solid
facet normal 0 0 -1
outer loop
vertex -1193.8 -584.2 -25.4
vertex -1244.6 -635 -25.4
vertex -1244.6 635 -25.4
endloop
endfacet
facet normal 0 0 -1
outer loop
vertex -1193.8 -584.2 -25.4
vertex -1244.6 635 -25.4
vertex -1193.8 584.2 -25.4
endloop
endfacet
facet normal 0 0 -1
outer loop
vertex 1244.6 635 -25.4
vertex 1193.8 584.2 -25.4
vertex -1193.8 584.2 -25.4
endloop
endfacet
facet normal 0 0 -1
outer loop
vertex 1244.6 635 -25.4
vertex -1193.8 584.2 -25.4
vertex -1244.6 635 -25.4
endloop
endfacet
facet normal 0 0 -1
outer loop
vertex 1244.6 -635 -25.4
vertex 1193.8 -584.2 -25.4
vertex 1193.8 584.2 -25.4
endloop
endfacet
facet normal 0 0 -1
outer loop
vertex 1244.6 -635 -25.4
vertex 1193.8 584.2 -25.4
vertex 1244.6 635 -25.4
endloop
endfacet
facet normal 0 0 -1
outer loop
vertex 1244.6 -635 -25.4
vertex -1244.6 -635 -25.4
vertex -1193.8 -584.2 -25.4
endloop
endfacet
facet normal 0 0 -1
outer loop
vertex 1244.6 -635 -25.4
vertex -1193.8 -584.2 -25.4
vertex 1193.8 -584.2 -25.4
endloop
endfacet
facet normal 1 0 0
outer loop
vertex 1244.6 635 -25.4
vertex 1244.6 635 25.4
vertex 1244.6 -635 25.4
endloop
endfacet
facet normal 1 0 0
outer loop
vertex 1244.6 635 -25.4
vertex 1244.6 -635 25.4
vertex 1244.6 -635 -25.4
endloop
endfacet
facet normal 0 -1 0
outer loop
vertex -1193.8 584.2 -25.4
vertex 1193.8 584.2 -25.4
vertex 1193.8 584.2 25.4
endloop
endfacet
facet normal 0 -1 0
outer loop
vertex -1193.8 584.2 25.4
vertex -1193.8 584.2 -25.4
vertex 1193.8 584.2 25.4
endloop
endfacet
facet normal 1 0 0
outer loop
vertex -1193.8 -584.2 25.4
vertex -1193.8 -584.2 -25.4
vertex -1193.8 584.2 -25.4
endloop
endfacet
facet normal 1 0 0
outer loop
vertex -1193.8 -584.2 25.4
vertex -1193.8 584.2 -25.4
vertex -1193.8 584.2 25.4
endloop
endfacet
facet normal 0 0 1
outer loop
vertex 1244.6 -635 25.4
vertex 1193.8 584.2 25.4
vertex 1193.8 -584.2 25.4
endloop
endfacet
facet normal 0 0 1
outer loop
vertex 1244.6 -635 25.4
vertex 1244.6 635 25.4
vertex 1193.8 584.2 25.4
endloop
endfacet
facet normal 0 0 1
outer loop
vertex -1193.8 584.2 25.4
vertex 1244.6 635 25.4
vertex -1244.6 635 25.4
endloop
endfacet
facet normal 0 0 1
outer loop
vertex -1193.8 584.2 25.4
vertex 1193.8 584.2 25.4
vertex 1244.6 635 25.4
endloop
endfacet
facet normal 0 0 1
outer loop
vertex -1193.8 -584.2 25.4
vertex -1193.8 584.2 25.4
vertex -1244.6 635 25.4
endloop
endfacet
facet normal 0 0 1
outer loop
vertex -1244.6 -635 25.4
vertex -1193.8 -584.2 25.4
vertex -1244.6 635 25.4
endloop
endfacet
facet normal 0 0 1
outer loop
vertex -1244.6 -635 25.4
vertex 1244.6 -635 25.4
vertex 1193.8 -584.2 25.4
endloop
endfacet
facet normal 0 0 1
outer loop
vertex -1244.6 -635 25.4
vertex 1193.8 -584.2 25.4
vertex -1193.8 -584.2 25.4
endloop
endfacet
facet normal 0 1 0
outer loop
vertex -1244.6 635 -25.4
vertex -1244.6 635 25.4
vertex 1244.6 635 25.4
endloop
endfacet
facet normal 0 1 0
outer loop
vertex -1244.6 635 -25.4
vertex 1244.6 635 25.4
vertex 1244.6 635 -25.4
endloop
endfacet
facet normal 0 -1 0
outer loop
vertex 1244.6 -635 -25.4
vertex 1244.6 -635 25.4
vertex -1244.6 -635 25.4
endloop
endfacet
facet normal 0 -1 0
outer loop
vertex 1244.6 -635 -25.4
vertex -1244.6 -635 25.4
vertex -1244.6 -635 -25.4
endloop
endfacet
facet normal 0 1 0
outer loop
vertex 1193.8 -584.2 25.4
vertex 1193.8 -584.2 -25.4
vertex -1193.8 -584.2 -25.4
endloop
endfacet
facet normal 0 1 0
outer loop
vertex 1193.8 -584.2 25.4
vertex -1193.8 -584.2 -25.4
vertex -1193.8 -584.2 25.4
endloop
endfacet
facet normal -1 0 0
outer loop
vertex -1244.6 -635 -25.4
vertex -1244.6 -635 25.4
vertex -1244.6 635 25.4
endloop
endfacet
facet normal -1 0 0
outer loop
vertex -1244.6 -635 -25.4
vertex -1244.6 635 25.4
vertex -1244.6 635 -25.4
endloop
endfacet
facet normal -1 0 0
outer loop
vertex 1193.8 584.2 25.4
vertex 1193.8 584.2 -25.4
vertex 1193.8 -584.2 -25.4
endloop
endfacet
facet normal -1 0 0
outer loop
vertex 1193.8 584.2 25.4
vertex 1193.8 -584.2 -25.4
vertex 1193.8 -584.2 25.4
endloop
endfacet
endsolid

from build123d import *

# Parameters (mm, degrees)
F1_W = 50.8
F1_H = 50.8


with BuildPart() as f2:
    # F2: sweep along a path in F0
    with BuildLine(Plane.XY) as f2_path:
        Line((-1219.2, 609.6), (-1219.2, -609.6))
        Line((-1219.2, -609.6), (1219.2, -609.6))
        Line((1219.2, -609.6), (1219.2, 609.6))
        Line((1219.2, 609.6), (-1219.2, 609.6))
    # F1 (on Front) → F2 (sweep)
    with BuildSketch(Plane.XZ):
        with Locations((-1219.2, 0)):
            Rectangle(F1_W, F1_H)
    sweep(path=f2_path.line, transition=Transition.RIGHT)


solid = f2.part
